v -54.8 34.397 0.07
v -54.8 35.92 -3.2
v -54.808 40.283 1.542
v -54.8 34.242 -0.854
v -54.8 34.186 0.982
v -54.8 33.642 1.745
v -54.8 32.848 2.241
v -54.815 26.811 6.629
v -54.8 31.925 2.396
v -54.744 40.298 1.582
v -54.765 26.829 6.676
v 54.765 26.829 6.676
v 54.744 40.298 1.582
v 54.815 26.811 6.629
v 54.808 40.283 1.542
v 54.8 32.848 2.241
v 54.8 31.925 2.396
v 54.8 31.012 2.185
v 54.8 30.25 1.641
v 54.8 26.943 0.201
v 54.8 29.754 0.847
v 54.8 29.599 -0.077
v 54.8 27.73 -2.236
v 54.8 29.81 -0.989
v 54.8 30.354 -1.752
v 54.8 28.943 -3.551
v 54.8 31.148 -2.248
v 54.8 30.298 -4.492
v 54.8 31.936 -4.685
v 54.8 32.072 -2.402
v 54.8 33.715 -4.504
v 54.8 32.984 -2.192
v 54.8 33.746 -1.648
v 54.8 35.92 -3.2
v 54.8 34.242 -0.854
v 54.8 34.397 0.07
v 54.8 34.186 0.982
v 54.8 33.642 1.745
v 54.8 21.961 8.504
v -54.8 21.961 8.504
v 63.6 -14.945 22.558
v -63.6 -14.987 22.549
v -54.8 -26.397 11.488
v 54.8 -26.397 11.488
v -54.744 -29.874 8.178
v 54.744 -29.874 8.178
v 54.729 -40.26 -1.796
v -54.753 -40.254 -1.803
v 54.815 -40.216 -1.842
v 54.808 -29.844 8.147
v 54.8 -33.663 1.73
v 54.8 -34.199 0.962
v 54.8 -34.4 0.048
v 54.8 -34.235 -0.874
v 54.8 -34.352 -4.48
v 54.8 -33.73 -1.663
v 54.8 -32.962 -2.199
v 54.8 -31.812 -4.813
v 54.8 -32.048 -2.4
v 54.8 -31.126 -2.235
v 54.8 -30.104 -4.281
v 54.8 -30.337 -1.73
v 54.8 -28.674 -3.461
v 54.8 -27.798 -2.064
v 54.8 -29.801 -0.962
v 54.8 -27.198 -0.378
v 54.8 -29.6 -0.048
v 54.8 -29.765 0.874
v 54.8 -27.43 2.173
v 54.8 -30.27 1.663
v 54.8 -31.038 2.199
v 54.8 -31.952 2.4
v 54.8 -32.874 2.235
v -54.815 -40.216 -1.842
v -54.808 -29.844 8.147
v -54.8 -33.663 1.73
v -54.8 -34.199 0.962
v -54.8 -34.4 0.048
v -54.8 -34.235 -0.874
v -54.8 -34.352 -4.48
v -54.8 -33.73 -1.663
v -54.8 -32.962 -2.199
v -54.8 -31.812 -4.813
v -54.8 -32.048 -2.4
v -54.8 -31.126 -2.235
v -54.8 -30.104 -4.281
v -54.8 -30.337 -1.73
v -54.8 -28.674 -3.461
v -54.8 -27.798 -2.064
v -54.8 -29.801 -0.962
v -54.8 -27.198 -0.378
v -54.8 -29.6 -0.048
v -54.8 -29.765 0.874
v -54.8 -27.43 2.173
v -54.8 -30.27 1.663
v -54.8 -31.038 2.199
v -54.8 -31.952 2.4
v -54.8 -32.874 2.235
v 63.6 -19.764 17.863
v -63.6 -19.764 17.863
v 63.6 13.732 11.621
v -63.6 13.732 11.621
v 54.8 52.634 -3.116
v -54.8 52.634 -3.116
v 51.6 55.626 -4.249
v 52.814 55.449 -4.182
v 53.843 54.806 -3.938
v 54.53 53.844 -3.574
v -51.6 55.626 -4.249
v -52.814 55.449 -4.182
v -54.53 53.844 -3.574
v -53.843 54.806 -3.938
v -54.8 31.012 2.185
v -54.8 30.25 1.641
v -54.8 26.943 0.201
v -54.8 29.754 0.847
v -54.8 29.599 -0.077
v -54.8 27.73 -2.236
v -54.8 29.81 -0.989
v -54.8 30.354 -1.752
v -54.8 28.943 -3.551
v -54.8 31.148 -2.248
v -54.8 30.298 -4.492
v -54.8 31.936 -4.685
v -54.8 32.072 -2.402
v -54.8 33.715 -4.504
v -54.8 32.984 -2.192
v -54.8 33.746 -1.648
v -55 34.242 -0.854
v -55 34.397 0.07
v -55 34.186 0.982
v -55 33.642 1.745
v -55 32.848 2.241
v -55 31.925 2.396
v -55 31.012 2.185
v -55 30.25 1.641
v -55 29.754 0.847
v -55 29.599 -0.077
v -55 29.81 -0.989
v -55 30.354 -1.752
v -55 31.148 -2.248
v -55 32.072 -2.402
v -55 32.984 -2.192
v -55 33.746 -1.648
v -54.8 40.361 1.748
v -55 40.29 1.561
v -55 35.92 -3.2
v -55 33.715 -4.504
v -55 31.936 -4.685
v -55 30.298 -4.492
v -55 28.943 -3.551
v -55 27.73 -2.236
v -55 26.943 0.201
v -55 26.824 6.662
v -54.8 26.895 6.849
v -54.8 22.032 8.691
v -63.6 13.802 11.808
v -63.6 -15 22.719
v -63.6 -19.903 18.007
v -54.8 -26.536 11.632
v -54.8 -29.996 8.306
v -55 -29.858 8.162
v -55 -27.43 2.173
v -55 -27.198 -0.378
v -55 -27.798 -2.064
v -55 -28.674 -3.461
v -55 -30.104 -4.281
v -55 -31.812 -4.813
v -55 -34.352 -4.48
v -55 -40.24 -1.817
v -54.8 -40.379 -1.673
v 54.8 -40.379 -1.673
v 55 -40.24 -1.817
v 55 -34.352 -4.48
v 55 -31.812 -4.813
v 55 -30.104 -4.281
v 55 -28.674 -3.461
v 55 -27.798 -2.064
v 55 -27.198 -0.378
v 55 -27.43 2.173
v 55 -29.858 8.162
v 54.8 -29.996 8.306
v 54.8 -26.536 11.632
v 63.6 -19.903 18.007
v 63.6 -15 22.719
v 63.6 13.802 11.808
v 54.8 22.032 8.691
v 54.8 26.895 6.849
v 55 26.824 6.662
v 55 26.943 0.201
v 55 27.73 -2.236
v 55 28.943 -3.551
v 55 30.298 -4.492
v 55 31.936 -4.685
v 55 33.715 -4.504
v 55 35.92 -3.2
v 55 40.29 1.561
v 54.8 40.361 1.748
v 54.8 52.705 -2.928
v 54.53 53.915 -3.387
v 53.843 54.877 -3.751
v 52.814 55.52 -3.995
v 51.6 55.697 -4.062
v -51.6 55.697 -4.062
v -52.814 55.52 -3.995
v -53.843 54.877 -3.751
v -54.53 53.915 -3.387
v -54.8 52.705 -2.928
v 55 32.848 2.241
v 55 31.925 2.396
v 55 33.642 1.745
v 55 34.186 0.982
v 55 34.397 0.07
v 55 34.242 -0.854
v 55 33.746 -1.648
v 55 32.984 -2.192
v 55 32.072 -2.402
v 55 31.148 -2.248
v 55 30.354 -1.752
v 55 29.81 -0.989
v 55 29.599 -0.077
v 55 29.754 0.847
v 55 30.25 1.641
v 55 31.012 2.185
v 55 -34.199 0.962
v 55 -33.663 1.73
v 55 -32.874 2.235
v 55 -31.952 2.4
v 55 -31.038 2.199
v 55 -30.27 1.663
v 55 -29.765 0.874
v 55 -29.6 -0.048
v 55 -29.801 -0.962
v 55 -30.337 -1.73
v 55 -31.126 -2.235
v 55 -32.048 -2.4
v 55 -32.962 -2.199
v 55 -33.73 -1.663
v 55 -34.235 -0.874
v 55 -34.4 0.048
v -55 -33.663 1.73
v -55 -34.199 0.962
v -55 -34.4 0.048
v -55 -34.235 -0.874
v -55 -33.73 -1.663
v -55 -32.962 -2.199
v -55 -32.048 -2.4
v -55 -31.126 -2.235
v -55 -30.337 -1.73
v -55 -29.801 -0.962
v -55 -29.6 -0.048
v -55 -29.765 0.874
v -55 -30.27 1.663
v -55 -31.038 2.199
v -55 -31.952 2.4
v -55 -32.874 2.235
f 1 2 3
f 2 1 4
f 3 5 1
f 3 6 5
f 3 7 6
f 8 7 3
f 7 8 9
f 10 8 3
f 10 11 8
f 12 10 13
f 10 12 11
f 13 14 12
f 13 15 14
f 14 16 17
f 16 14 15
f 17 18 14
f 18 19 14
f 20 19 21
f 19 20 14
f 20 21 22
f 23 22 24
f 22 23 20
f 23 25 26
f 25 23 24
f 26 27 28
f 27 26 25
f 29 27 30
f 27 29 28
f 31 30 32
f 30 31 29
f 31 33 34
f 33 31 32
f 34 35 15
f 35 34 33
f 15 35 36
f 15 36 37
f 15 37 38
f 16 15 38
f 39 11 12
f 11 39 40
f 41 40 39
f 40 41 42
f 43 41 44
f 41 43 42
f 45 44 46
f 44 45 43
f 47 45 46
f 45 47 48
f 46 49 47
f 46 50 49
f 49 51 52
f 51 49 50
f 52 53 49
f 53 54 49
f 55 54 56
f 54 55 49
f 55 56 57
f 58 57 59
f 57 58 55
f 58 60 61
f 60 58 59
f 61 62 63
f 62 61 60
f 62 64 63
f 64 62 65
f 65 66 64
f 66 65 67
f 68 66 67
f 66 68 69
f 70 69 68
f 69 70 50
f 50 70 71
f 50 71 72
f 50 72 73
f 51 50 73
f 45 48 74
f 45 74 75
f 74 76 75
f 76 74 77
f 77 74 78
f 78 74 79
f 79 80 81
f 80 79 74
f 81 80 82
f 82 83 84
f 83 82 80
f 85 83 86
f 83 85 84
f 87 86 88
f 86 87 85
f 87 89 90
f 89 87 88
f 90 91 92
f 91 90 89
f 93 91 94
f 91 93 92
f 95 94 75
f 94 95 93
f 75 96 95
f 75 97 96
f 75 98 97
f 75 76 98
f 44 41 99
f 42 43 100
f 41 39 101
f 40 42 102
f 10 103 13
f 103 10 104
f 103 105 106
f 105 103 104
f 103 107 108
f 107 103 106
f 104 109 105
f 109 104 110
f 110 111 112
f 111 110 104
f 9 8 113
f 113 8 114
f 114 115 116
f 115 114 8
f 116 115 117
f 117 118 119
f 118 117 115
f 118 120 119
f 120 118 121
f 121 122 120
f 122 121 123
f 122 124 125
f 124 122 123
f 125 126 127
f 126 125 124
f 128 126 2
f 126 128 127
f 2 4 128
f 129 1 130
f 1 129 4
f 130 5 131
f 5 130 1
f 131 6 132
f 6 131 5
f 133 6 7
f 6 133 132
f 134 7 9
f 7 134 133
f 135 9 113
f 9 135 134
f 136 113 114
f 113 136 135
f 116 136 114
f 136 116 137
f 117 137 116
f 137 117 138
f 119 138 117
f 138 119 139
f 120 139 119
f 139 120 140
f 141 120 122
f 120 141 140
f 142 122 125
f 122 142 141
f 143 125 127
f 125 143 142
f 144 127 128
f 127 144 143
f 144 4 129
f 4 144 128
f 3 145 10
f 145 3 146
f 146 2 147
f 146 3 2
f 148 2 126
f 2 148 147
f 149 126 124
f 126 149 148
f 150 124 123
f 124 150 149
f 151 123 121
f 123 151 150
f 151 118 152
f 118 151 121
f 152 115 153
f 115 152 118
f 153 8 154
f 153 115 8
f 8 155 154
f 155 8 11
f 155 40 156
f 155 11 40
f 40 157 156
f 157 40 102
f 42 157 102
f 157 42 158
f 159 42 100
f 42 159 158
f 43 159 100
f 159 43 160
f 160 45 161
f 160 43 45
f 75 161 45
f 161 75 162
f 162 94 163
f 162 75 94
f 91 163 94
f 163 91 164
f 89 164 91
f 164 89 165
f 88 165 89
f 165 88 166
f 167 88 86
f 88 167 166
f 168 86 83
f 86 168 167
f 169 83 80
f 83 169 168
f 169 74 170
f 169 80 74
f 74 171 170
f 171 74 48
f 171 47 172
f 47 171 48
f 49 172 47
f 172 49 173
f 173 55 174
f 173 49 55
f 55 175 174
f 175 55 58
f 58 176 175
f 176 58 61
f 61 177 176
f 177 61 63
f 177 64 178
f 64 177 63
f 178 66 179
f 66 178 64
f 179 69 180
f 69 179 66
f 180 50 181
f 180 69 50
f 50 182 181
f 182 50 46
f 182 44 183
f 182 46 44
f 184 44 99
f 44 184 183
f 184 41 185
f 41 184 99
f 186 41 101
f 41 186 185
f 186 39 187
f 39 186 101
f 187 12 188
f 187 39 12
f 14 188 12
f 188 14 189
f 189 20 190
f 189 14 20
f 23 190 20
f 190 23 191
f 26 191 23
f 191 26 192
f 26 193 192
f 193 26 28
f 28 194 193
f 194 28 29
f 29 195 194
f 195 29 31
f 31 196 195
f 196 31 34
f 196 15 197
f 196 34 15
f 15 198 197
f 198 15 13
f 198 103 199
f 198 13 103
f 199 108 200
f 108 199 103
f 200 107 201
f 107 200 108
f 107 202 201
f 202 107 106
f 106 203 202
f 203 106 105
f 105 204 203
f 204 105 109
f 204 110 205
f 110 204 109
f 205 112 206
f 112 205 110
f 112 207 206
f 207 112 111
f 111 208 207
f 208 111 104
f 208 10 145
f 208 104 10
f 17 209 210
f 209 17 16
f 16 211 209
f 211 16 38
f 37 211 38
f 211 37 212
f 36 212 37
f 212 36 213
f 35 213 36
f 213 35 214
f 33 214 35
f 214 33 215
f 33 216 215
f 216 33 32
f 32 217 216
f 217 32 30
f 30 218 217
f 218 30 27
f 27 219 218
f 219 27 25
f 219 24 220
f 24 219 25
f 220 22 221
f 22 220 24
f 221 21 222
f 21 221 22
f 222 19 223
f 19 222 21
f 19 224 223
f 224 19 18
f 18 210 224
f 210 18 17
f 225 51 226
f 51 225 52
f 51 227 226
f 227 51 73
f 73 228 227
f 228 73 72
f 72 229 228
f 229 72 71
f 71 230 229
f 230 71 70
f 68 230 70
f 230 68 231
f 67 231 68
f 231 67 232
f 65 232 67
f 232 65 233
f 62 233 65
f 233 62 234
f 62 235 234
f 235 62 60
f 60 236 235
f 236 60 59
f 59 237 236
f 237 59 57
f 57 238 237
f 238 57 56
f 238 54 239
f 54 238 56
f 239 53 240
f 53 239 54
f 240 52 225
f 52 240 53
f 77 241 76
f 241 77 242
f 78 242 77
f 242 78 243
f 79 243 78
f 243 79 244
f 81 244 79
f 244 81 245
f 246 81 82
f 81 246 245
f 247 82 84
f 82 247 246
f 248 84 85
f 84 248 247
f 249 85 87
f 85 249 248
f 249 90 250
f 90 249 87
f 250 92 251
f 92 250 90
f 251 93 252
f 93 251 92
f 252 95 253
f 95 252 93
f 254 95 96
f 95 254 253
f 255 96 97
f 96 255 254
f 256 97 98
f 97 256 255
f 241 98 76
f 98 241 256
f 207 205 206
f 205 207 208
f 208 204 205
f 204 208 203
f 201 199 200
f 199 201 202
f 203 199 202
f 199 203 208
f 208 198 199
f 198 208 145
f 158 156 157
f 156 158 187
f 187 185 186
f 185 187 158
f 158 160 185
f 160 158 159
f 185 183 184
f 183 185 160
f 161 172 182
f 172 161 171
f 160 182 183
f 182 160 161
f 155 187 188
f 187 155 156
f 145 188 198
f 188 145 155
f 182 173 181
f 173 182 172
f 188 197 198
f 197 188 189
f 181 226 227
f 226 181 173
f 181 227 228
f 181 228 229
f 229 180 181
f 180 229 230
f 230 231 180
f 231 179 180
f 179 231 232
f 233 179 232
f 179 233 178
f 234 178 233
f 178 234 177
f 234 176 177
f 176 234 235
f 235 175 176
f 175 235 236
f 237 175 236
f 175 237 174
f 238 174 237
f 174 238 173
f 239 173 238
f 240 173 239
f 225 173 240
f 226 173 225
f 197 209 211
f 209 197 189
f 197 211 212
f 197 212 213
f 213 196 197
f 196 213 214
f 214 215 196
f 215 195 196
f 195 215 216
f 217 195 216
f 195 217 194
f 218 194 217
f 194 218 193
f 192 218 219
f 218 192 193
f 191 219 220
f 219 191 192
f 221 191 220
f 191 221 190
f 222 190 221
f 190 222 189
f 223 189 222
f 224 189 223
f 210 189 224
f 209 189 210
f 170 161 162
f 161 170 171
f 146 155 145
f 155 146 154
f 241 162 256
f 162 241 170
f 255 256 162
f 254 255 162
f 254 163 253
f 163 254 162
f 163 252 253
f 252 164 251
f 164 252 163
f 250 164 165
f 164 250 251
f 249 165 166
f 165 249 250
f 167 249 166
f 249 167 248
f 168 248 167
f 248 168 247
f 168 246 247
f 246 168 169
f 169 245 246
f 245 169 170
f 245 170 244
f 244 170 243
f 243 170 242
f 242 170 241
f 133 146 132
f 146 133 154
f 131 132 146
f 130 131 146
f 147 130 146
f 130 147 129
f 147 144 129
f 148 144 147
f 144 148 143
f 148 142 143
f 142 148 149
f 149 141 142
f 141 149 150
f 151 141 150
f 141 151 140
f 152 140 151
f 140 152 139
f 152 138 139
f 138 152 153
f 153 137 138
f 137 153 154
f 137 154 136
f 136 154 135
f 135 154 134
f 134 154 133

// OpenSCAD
use <../lib.scad>
use <s/u9331c01s01.scad>
use <s/u9331c01s02.scad>
use <s/u9331c01s03.scad>
function ldraw_lib__28884c01() = [
// 0 Cardboard Ramp 16 x 14 with Yellow Curbs and Chevrons Pattern (Formed)
// 0 Name: 28884c01.dat
// 0 Author: Philippe Hurbain [Philo]
// 0 !LDRAW_ORG Part UPDATE 2023-03
// 0 !LICENSE Licensed under CC BY 4.0 : see CAreadme.txt
// 
// 0 BFC CERTIFY CCW
  [0,"BFC","CERTIFY"],
  [0,"BFC","CCW"],
// 
// 0 !CATEGORY Sheet Cardboard
// 0 !KEYWORDS Set 42058, Stunt Bike
// 
// 0 !HISTORY 2023-06-24 [OrionP] Official Update 2023-03
// 
// 
// 1 16 0 0 0 1 0 0 0 1 0 0 0 1 s\u9331c01s01.dat
  [1,16,0,0,0,1,0,0,0,1,0,0,0,1, ldraw_lib__s__u9331c01s01()],
// 0 !TEXMAP START PLANAR -160 0 139.243 160 0 139.243 -160 0 -100.947 28884c01a.png
// 0 !: 1 16 0 0 0 1 0 0 0 1 0 0 0 1 s\u9331c01s02.dat
// 0 !TEXMAP FALLBACK
// 1 16 0 0 0 1 0 0 0 1 0 0 0 1 s\u9331c01s02.dat
  [1,16,0,0,0,1,0,0,0,1,0,0,0,1, ldraw_lib__s__u9331c01s02()],
// 0 !TEXMAP END
// 0 !TEXMAP START PLANAR 0 -20.5 -100.5 0 -20.5 100.5 0 12.5 -100.5 28884c01b.png
// 0 !: 1 16 0 0 0 1 0 0 0 1 0 0 0 1 s\u9331c01s03.dat
// 0 !TEXMAP FALLBACK
// 1 16 0 0 0 1 0 0 0 1 0 0 0 1 s\u9331c01s03.dat
  [1,16,0,0,0,1,0,0,0,1,0,0,0,1, ldraw_lib__s__u9331c01s03()],
// 0 !TEXMAP END
// 0 !TEXMAP START PLANAR 0 -20.5 100.5 0 -20.5 -100.5 0 12.5 100.5 28884c01b.png
// 0 !: 1 16 0 0 0 -1 0 0 0 1 0 0 0 1 s\u9331c01s03.dat
// 0 !TEXMAP FALLBACK
// 1 16 0 0 0 -1 0 0 0 1 0 0 0 1 s\u9331c01s03.dat
  [1,16,0,0,0,-1,0,0,0,1,0,0,0,1, ldraw_lib__s__u9331c01s03()],
// 0 !TEXMAP END
];
module ldraw_lib__28884c01(step=0, col=false, unit=2/5, alt=false, line=0.2, solid=!$preview)
    makepoly(ldraw_lib__28884c01(), step=step, col=col, unit=unit, alt=alt, line=line, solid=solid);
ldraw_lib__28884c01(line=0.2);
